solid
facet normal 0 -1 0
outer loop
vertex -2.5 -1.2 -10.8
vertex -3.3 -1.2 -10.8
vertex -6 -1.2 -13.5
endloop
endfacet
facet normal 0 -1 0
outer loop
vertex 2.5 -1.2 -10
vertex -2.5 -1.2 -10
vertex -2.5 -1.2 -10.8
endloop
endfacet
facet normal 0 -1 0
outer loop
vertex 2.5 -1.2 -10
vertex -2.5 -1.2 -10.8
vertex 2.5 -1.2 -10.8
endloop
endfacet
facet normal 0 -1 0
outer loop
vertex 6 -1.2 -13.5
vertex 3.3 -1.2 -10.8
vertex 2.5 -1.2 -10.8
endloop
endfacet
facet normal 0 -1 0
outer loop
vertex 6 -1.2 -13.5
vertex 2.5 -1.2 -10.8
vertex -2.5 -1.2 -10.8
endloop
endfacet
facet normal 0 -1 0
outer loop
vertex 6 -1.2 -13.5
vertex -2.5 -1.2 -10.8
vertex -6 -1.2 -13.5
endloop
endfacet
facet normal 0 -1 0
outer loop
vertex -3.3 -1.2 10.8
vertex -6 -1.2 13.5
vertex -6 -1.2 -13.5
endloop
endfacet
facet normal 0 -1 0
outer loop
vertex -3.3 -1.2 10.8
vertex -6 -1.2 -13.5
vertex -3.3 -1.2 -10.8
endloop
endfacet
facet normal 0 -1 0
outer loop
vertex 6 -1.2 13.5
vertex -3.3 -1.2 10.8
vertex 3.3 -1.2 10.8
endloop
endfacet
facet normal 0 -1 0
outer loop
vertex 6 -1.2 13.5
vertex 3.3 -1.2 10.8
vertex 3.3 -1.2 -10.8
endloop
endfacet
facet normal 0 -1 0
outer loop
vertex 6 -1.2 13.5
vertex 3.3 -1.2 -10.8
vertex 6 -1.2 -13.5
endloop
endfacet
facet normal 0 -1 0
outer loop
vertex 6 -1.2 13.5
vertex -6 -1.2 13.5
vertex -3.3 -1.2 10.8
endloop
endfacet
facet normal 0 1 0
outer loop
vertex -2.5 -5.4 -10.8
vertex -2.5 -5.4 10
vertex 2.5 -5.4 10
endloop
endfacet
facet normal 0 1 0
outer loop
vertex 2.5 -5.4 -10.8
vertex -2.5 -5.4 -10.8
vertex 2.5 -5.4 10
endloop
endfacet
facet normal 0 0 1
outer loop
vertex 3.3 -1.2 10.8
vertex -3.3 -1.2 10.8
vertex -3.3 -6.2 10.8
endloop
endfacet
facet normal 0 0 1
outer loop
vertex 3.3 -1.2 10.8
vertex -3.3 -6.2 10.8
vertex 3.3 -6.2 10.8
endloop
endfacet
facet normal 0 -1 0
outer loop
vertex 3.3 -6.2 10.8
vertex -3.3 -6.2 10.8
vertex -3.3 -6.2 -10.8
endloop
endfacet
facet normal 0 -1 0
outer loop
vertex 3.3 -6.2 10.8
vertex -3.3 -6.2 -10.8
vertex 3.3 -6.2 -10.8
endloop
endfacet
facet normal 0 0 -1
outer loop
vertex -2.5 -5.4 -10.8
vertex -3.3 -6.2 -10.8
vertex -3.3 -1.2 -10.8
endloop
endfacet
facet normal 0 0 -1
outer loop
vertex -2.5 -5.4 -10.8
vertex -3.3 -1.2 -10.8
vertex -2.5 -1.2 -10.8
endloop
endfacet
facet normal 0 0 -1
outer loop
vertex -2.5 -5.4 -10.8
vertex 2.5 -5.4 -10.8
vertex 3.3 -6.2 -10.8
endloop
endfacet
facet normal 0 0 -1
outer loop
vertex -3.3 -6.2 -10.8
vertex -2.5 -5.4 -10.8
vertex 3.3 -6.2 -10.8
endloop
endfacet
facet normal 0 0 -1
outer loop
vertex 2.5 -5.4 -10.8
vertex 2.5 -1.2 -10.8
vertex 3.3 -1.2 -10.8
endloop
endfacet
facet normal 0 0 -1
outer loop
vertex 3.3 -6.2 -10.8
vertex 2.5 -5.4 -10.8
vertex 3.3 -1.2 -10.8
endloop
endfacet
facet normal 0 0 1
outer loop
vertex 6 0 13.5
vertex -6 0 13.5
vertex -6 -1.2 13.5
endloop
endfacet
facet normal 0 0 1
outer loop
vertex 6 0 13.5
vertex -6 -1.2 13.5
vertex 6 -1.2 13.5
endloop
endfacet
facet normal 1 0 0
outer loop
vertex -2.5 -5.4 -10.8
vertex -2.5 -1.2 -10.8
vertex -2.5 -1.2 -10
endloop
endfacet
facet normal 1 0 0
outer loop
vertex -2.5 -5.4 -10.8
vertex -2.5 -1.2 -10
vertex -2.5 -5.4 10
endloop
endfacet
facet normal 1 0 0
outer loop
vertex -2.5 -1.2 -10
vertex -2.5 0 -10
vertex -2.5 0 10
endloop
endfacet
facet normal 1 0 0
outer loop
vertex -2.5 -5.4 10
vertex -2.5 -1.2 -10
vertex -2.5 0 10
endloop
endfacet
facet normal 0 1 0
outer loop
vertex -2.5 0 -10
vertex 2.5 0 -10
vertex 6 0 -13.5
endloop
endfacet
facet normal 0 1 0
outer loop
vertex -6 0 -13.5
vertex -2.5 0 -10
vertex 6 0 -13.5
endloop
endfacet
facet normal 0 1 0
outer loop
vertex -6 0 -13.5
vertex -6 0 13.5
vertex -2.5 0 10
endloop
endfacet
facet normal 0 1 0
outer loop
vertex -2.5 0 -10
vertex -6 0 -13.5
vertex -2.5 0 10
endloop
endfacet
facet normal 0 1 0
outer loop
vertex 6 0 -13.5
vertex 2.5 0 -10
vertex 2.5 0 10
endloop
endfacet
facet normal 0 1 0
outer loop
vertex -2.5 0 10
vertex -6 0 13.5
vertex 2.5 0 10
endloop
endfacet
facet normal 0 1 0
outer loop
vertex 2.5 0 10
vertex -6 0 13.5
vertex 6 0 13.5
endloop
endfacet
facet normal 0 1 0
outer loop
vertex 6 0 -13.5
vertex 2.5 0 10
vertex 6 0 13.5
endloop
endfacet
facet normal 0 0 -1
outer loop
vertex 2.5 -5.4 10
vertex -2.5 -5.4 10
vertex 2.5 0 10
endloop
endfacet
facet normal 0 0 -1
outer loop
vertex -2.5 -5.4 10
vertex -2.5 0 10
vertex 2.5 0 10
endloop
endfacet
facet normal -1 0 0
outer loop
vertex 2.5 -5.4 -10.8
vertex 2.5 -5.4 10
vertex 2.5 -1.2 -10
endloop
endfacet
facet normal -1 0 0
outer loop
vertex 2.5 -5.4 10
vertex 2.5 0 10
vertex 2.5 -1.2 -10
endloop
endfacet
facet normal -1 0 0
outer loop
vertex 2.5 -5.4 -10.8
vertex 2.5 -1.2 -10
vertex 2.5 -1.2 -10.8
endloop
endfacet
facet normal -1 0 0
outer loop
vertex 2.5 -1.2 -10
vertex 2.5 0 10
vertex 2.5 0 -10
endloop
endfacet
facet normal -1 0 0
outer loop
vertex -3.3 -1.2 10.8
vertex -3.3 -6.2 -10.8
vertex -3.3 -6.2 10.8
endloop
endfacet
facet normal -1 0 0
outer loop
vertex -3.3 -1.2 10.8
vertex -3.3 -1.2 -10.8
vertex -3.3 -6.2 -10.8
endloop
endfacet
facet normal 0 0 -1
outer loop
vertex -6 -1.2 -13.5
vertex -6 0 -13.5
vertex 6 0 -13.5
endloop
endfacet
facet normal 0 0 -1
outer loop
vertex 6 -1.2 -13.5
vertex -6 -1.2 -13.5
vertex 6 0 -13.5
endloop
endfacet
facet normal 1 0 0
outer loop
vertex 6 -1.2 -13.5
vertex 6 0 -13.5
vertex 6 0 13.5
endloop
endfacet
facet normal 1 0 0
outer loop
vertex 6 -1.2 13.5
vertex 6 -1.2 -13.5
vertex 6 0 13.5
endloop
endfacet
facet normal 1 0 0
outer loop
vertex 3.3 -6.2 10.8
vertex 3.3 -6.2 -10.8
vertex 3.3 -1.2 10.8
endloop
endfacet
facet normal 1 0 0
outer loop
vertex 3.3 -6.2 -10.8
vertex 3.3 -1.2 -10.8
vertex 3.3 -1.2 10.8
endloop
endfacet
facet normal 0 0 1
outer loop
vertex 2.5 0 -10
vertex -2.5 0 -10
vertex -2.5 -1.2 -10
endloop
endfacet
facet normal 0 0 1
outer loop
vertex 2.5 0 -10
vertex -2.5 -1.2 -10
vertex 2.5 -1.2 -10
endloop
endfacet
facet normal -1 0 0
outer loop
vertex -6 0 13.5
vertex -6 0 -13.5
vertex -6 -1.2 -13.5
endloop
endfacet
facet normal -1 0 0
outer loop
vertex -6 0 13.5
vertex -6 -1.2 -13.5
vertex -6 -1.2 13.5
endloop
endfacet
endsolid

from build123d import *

# Parameters (mm, degrees)
F0_W     = 12
F0_H     = 27
F0_W_2   = 5
F0_H_2   = 20
F1_DEPTH = 1.2
F3_DEPTH = 4.2
F4_W     = 6.6
F4_H     = 21.6
F5_DEPTH = 0.8


with BuildPart() as f1:
    # F0 (on Front) → F1 (new body)
    with BuildSketch(Plane.XZ):
        Rectangle(F0_W, F0_H)
        Rectangle(F0_W_2, F0_H_2, mode=Mode.SUBTRACT)
    extrude(amount=F1_DEPTH)

    # F2 (on face) → F3 (join)
    with BuildSketch(Plane.XZ.offset(1.2)):
        Polygon((-2.5, -10.8), (-2.5, 10), (2.5, 10), (2.5, -10), (2.5, -10.8), (3.3, -10.8), (3.3, 10.8), (-3.3, 10.8), (-3.3, -10.8), align=None)
    extrude(amount=F3_DEPTH)

    # F4 (on face) → F5 (join)
    with BuildSketch(Plane.XZ.offset(5.4)):
        Rectangle(F4_W, F4_H)
    extrude(amount=F5_DEPTH)


solid = f1.part
